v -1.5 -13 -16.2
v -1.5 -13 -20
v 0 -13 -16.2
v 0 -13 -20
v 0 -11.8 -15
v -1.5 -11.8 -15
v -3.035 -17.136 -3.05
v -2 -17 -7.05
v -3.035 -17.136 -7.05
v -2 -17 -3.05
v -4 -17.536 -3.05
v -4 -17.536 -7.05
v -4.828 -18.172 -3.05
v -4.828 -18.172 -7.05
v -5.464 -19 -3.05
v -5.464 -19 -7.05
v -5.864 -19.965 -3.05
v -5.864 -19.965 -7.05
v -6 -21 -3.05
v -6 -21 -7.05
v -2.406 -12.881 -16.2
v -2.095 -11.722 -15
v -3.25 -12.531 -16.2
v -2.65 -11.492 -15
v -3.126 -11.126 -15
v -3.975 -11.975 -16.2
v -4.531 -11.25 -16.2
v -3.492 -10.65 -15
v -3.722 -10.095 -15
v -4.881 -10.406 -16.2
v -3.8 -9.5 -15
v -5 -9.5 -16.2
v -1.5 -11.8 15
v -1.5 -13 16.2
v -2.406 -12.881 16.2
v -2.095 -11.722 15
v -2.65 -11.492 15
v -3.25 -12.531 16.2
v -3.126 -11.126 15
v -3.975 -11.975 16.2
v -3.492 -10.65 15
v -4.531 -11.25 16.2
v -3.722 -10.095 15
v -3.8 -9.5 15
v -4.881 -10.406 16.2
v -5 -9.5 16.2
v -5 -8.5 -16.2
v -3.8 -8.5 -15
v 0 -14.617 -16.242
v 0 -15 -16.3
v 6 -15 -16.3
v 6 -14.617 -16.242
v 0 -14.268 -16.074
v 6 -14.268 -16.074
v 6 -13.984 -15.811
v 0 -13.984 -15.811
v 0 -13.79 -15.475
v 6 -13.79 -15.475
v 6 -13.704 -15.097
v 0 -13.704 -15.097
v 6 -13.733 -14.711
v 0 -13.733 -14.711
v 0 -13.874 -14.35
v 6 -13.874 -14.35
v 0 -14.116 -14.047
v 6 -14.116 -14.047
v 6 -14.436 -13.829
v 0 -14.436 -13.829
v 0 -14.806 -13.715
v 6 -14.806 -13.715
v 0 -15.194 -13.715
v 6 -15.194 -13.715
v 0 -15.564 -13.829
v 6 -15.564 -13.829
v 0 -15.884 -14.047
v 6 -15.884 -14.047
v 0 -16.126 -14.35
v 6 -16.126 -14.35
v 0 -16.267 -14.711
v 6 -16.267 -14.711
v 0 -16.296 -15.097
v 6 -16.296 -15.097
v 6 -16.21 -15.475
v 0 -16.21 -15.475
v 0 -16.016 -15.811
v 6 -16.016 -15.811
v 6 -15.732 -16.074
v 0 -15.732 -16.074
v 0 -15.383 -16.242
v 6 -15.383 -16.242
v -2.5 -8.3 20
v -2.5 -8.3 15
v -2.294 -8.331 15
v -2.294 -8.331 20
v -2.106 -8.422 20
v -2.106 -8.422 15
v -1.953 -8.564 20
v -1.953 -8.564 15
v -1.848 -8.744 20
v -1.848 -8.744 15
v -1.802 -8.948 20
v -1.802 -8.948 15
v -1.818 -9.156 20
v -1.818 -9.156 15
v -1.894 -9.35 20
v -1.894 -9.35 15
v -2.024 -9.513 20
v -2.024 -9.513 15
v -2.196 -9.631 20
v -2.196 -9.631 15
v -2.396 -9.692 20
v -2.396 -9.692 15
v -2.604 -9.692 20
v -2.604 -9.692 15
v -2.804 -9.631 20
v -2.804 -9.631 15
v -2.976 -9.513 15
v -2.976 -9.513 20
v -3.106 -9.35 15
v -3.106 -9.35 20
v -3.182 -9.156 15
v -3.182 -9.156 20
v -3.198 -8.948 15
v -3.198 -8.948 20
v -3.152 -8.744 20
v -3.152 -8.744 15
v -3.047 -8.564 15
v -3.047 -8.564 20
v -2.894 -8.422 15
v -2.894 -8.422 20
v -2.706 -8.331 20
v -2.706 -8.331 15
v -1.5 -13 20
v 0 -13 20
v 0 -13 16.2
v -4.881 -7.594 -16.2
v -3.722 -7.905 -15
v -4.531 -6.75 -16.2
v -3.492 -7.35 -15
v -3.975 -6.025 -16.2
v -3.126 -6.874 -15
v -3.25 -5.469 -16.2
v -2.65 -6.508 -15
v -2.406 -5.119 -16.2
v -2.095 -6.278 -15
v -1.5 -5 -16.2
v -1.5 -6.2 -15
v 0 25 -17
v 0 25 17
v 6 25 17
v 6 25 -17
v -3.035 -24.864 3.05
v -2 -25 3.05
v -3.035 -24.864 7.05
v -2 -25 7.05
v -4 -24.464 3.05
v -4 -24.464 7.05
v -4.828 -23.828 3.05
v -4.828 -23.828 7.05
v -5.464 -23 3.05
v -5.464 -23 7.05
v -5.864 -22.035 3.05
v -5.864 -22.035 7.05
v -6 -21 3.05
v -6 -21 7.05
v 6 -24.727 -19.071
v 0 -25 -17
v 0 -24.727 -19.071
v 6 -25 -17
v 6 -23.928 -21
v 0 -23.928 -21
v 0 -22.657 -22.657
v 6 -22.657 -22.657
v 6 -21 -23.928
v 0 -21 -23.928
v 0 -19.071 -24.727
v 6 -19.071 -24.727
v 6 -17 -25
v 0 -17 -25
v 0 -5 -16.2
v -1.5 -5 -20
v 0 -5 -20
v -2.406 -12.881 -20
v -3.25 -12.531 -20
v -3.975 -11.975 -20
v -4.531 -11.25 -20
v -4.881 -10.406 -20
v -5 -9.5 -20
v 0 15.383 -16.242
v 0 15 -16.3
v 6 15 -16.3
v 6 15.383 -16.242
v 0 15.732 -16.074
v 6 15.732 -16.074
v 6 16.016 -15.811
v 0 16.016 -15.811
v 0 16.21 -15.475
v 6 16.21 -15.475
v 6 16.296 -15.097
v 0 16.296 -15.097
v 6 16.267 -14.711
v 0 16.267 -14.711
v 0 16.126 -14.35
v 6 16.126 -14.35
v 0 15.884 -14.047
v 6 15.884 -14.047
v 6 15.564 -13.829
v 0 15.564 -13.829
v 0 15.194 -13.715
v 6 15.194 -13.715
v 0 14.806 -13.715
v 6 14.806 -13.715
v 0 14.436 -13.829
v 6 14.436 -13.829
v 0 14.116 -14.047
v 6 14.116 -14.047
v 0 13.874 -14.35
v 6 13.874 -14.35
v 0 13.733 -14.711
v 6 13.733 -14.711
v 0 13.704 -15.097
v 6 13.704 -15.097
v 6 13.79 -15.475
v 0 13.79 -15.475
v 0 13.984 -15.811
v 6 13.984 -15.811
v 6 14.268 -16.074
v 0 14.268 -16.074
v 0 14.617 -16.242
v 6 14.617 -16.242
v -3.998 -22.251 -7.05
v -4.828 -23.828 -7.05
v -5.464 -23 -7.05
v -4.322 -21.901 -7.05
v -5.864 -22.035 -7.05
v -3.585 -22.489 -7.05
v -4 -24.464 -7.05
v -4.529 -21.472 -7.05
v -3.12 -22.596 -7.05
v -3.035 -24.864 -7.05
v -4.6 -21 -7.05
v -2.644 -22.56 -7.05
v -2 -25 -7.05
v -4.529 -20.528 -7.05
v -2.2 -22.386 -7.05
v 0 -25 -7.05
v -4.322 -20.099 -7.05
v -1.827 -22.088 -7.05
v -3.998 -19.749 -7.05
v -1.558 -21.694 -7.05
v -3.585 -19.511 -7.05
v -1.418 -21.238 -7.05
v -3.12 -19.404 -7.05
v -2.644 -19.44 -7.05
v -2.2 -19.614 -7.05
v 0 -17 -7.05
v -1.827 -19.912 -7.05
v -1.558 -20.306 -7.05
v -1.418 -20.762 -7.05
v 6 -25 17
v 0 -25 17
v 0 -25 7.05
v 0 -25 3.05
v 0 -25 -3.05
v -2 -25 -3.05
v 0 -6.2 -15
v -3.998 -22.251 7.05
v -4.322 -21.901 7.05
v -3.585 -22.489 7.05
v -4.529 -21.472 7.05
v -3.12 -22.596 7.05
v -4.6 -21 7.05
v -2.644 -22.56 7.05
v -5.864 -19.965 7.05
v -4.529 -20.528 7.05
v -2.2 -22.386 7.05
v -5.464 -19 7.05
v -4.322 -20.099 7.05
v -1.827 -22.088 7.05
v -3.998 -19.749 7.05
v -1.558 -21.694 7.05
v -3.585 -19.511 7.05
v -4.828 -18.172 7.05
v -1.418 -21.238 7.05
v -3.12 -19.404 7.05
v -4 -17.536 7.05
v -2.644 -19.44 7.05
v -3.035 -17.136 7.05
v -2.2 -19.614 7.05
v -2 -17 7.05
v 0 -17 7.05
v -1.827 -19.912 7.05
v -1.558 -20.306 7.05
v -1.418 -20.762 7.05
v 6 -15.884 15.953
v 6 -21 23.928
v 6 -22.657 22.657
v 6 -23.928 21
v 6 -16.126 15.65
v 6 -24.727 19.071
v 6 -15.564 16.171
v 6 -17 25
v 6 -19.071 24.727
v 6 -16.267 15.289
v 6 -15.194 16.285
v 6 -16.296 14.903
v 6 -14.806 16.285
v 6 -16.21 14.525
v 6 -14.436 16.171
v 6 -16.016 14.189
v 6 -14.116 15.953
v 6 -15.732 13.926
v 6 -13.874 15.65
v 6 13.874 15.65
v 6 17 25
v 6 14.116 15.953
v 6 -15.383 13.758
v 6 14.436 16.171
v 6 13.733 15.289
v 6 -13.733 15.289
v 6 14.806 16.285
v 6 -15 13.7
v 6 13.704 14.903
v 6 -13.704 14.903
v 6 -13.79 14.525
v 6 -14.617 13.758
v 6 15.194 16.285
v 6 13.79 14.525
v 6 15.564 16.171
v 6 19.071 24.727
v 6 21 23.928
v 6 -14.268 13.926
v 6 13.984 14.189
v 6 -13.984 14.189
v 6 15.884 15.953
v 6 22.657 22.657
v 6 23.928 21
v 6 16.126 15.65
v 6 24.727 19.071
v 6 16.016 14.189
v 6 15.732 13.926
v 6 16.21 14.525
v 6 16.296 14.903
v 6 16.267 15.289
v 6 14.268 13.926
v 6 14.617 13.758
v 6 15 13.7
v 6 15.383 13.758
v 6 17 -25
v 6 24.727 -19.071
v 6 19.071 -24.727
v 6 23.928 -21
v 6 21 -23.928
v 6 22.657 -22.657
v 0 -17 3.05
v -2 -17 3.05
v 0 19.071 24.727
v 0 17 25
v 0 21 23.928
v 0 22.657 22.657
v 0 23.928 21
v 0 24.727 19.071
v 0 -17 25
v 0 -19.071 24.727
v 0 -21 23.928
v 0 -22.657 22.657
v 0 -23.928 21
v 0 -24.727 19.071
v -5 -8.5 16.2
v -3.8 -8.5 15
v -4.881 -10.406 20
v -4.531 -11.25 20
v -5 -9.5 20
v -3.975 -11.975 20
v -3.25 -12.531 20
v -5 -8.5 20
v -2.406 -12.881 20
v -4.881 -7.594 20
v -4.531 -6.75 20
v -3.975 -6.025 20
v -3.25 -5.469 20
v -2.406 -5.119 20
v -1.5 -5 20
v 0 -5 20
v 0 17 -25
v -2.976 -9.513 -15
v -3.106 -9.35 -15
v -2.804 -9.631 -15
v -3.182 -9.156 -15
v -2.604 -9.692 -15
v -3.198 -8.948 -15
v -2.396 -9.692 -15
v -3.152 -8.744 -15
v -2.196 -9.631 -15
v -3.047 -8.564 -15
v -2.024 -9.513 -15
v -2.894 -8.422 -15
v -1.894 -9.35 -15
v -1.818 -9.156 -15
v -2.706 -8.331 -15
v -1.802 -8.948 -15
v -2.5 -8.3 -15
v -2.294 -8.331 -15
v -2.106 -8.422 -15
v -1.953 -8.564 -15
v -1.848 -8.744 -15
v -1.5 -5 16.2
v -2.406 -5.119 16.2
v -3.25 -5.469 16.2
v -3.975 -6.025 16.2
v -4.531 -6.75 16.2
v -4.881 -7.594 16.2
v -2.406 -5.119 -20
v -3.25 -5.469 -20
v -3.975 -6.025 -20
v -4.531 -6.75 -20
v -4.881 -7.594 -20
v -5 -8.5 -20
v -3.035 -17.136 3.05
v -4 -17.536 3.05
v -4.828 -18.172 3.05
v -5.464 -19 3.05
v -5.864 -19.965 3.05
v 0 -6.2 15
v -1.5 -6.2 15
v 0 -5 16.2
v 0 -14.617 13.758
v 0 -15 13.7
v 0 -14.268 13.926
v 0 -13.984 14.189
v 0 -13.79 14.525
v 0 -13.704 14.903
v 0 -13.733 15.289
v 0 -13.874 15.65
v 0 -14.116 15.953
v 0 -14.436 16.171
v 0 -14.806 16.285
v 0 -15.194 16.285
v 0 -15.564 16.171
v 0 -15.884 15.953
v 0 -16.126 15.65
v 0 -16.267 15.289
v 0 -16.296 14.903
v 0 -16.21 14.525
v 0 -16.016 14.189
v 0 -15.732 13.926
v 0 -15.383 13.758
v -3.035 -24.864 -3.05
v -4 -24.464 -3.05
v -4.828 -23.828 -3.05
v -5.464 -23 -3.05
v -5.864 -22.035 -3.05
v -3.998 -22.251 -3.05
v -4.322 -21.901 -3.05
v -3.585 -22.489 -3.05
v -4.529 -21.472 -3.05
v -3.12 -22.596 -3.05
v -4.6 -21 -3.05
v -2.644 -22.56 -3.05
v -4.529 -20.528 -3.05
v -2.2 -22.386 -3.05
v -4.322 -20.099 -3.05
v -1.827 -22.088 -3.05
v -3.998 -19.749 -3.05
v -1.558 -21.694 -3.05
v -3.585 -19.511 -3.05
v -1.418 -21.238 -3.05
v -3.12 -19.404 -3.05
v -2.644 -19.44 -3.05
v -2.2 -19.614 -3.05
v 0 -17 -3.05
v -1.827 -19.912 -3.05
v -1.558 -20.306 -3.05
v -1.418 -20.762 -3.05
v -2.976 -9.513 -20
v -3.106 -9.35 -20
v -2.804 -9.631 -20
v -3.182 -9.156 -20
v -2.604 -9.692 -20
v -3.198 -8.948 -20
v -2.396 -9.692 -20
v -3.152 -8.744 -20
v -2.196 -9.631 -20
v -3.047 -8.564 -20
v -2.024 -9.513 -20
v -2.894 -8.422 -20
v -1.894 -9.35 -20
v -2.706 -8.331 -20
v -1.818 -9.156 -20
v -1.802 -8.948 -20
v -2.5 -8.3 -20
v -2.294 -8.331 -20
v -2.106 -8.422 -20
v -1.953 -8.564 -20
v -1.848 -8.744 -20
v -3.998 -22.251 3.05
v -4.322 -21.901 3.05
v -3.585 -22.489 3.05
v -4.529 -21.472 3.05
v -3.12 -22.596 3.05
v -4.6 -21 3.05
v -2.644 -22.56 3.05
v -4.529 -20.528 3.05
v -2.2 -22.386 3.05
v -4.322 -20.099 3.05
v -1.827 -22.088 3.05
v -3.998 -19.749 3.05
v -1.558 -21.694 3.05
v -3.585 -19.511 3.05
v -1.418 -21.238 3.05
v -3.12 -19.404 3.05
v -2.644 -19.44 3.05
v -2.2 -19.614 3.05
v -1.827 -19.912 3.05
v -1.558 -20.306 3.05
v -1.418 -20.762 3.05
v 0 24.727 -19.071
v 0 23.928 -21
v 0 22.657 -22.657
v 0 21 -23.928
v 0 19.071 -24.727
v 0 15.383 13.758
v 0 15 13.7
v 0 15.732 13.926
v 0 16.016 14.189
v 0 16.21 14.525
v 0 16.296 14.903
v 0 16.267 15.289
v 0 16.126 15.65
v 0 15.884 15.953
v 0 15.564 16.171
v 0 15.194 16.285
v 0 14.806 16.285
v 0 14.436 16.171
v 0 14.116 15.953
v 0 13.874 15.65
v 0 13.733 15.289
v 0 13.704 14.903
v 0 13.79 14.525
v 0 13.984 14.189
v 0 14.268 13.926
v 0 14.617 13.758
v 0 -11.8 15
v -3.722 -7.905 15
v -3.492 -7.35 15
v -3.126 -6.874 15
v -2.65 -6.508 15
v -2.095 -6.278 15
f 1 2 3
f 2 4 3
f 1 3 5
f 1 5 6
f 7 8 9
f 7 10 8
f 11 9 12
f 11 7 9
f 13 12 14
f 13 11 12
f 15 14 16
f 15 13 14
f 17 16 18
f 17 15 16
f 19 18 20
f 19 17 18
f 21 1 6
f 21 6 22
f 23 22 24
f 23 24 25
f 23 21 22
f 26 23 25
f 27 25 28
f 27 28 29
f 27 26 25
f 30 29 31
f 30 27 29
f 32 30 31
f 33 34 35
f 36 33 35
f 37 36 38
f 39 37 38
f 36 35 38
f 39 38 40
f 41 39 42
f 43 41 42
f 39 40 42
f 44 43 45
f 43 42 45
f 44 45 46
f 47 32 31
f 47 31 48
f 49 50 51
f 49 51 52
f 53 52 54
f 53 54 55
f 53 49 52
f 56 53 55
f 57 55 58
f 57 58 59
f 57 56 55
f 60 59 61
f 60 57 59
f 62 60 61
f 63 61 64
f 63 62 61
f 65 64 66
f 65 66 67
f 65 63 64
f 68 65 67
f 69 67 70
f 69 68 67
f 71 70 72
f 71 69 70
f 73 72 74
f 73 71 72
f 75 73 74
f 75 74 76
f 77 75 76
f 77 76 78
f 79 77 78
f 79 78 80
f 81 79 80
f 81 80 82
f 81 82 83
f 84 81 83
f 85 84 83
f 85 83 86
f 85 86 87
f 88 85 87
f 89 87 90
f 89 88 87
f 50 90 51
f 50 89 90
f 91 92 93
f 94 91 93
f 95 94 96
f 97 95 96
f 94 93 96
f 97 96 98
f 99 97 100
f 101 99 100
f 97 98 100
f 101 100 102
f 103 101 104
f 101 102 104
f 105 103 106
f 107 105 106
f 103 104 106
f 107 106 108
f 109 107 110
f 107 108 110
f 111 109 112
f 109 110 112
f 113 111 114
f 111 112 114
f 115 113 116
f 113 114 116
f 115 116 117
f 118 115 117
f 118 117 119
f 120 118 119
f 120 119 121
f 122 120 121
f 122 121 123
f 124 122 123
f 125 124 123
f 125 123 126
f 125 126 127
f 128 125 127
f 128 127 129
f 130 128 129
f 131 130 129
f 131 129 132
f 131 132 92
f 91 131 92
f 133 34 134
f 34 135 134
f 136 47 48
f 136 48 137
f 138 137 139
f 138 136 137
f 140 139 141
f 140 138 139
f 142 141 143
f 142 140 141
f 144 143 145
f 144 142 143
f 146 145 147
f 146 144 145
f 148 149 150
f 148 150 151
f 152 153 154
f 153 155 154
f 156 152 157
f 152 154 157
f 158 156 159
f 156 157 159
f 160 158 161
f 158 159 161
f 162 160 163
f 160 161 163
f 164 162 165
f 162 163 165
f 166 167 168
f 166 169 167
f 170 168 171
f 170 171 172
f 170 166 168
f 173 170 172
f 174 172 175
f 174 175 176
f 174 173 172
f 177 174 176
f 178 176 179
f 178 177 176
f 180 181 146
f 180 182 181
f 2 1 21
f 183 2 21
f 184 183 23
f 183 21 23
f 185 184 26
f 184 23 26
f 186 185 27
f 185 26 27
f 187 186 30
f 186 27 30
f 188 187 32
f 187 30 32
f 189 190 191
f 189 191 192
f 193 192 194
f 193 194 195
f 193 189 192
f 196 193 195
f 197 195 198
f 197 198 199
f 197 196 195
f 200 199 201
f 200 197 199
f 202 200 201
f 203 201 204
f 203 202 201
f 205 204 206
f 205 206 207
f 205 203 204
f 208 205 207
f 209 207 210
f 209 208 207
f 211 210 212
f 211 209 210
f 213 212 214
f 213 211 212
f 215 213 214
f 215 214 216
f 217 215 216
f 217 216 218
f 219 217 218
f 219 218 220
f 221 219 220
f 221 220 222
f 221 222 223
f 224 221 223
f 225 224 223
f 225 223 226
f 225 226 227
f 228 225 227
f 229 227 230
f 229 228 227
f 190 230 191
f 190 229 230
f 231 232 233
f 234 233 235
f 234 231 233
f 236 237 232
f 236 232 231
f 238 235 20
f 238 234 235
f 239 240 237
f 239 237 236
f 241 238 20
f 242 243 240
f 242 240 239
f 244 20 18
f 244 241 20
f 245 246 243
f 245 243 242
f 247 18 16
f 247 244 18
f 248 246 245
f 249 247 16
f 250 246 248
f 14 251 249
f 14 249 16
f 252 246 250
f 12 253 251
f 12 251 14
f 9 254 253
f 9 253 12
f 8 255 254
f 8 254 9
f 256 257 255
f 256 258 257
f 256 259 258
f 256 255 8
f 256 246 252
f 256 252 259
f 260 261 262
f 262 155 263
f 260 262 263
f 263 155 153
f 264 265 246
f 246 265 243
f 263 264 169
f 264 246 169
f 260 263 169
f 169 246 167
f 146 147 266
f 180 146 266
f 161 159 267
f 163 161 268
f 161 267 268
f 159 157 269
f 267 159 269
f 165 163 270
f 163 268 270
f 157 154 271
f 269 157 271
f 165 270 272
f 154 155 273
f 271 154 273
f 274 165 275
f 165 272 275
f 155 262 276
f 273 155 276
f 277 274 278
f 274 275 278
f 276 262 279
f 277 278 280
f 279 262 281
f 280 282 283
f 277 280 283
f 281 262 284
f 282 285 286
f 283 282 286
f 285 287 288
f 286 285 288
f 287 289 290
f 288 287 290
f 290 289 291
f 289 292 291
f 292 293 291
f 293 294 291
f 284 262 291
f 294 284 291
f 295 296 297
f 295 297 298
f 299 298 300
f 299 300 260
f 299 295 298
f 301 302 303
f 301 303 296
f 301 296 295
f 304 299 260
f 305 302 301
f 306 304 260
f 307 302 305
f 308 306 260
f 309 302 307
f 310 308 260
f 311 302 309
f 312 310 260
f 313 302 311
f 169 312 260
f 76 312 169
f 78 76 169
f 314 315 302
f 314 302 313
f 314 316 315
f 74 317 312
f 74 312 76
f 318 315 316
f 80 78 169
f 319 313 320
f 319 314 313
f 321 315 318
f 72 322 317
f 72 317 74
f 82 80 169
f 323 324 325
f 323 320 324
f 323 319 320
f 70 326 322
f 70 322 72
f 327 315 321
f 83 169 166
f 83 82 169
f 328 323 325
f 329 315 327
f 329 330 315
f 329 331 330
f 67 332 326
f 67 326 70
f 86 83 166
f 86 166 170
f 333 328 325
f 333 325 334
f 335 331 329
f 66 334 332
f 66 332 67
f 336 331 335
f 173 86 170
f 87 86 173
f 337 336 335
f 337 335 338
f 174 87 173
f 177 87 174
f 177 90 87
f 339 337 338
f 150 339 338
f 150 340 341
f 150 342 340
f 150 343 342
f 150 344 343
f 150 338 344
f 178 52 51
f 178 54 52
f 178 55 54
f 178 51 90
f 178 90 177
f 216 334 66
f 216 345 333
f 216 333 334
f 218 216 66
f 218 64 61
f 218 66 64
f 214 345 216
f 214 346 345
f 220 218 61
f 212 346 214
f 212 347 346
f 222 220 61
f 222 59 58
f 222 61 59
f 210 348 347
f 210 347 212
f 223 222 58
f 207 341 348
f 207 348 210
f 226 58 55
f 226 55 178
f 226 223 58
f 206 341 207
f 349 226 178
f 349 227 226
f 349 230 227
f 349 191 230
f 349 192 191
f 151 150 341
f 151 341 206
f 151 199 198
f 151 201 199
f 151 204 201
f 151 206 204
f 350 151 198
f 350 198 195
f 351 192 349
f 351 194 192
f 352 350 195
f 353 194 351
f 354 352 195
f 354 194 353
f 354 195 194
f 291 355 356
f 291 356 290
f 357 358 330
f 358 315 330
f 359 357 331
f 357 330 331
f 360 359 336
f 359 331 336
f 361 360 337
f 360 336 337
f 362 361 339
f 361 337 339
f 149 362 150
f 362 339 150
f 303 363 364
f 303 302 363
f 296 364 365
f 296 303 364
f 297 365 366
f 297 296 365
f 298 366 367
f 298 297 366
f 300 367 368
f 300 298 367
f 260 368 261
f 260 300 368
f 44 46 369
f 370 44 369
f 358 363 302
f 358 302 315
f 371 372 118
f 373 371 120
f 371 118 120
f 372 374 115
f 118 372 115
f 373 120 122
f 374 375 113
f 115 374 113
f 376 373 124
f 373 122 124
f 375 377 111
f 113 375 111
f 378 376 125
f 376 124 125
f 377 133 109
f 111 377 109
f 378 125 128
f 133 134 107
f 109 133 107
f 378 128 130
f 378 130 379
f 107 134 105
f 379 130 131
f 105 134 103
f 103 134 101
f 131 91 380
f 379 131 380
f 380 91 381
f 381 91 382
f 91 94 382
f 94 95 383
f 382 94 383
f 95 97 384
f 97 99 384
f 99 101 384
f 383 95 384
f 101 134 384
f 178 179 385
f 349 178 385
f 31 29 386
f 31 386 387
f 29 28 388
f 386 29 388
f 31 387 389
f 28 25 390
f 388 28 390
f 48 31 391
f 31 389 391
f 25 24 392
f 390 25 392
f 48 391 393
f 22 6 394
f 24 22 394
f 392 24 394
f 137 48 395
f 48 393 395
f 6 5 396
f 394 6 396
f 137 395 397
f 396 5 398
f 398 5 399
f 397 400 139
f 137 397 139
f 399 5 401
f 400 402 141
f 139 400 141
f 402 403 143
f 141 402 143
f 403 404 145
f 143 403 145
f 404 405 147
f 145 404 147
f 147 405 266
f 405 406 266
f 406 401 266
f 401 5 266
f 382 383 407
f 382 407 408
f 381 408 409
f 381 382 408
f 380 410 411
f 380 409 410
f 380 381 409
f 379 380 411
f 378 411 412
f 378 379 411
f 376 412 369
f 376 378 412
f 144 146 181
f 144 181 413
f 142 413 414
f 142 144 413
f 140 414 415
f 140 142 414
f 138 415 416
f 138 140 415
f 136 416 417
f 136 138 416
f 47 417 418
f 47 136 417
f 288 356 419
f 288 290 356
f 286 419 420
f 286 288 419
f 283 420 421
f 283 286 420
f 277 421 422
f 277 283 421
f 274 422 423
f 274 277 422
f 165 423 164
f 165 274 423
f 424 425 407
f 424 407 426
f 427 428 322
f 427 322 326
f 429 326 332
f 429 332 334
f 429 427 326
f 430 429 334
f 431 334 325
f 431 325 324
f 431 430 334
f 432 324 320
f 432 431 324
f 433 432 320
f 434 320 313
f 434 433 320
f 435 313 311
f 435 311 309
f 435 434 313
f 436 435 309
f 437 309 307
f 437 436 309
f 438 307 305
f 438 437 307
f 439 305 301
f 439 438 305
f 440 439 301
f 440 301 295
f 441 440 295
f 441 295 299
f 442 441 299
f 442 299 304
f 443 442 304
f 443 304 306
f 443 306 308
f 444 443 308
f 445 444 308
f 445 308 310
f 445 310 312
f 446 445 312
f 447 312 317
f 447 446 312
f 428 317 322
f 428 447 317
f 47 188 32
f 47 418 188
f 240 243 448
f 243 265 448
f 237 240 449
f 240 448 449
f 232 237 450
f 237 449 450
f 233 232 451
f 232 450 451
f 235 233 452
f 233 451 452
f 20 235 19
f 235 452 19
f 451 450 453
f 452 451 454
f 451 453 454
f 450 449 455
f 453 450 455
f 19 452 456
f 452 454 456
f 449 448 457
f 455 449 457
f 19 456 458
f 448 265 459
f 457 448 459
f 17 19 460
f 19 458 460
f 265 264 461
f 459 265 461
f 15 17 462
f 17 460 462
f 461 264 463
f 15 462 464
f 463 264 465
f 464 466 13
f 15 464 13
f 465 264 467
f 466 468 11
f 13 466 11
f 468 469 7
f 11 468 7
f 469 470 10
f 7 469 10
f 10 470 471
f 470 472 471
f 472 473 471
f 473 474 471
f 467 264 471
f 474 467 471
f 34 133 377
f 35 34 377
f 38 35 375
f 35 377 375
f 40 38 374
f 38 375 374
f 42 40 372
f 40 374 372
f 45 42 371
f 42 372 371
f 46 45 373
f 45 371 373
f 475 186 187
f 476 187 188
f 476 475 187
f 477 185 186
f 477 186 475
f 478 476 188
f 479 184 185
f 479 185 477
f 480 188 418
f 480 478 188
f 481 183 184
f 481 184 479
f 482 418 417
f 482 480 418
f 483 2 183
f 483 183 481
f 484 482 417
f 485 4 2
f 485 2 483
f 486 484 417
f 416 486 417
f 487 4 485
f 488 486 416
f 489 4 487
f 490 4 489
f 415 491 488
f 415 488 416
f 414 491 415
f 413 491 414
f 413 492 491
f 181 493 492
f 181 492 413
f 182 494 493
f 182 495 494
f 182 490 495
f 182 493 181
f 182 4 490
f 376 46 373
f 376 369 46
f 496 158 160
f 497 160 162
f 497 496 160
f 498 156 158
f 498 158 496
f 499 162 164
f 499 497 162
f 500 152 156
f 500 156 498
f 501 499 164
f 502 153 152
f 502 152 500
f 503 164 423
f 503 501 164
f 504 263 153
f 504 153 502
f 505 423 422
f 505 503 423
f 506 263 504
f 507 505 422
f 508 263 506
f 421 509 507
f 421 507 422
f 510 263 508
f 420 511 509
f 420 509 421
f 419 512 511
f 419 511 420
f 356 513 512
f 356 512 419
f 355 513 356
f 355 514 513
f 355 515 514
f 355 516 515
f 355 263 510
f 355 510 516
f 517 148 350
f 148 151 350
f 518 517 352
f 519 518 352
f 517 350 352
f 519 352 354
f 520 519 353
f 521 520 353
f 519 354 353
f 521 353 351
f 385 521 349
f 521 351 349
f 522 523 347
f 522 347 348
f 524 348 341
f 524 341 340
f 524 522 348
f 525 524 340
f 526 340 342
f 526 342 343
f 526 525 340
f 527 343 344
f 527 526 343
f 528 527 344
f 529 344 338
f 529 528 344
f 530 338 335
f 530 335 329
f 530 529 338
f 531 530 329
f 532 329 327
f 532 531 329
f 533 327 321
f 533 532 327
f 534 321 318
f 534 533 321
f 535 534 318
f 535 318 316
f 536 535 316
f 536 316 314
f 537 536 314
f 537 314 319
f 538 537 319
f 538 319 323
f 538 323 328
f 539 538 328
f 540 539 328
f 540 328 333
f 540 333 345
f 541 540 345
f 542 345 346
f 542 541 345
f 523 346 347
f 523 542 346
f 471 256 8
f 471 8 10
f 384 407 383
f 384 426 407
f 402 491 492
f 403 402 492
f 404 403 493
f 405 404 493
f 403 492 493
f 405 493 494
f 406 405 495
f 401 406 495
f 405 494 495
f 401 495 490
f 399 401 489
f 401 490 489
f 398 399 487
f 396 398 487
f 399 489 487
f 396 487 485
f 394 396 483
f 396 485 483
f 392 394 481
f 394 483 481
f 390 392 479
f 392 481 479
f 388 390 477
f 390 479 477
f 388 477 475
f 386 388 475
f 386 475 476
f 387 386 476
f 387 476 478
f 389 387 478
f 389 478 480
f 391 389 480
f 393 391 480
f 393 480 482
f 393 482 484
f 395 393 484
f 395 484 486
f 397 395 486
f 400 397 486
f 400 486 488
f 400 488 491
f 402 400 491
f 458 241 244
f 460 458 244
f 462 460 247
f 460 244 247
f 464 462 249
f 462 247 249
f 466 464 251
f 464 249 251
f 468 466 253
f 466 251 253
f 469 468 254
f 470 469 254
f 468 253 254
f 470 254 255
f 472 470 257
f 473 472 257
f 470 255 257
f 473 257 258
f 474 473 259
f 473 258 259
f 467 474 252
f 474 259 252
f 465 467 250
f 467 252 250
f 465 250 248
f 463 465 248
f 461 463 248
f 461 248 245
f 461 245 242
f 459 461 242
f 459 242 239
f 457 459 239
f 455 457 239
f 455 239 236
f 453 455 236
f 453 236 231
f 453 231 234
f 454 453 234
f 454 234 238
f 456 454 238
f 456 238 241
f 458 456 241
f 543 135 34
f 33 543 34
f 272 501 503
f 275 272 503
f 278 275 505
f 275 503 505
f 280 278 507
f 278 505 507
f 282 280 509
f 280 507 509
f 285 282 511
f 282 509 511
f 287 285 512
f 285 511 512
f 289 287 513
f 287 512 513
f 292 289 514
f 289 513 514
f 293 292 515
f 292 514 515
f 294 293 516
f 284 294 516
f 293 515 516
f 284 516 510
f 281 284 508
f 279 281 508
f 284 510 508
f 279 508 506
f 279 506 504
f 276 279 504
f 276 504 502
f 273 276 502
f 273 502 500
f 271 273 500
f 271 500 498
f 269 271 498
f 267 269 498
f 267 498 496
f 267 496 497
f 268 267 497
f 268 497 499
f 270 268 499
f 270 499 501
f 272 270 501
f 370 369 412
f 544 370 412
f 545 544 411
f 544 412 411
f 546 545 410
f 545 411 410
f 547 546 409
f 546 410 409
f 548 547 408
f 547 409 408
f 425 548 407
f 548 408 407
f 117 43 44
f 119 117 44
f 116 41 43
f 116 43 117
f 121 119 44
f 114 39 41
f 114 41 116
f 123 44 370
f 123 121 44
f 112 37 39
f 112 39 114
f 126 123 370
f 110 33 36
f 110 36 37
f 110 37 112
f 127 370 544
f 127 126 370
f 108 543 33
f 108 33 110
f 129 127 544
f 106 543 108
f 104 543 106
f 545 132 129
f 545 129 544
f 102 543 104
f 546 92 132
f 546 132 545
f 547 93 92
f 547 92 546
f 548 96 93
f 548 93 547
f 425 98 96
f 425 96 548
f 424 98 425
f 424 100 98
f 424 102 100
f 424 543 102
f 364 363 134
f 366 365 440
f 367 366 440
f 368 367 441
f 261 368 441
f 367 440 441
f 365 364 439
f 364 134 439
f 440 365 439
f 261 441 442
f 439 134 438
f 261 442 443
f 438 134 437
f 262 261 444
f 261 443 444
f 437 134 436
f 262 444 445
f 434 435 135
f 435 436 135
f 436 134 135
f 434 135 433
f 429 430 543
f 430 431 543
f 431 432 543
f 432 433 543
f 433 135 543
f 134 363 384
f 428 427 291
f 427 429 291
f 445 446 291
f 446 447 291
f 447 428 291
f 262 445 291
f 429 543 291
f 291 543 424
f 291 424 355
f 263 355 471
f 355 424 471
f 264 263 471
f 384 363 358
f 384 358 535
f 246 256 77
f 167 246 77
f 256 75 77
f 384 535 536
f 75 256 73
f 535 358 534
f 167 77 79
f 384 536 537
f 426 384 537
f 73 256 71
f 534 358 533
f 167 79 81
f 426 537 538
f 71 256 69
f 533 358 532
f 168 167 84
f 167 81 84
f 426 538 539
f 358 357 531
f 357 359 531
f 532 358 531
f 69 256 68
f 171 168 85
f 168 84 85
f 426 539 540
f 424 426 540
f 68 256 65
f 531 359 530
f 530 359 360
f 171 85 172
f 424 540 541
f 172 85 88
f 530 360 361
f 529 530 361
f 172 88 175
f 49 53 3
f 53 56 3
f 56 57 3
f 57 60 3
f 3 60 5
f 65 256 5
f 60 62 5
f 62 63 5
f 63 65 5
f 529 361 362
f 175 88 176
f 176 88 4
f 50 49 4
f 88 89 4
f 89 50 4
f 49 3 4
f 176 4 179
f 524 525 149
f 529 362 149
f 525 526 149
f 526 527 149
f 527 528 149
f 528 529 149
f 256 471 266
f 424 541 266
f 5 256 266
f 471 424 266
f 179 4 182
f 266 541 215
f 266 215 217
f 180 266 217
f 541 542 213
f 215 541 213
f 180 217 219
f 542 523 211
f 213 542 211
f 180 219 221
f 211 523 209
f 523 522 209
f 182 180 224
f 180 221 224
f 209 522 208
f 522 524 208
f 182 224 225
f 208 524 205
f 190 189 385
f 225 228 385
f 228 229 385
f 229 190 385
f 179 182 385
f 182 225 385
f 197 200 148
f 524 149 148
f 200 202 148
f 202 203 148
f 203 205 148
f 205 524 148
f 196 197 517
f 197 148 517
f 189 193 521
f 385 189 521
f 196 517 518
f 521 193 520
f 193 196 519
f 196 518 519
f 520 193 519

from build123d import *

# Parameters (mm, degrees)
SKETCH1_W           = 50
SKETCH1_H           = 50
SKETCH1_R           = 1.3
BOSS_EXTRUDE1_DEPTH = 6
FILLET1_R           = 8
SKETCH2_W           = 4
SKETCH2_H           = 8
BOSS_EXTRUDE2_DEPTH = 6
FILLET2_R           = 4
SKETCH6_R           = 1.6
CUT_EXTRUDE3_DEPTH  = 36
SKETCH4_W           = 5
SKETCH4_H           = 8
BOSS_EXTRUDE4_DEPTH = 5
FILLET3_R           = 3.5
SKETCH5_R           = 0.7
CUT_EXTRUDE2_DEPTH  = 44
CHAMFER3_SIZE       = 1.2


with BuildPart() as part:
    # Sketch1 → Boss-Extrude1 (new body)
    with BuildSketch(Plane(origin=(0, 0, 0), x_dir=(0, 0, -1), z_dir=(1, 0, 0))):
        Rectangle(SKETCH1_W, SKETCH1_H)
        with Locations((-15, 15)):
            Circle(SKETCH1_R, mode=Mode.SUBTRACT)
        with Locations((15, 15)):
            Circle(SKETCH1_R, mode=Mode.SUBTRACT)
        with Locations((15, -15)):
            Circle(SKETCH1_R, mode=Mode.SUBTRACT)
        with Locations((-15, -15)):
            Circle(SKETCH1_R, mode=Mode.SUBTRACT)
    extrude(amount=BOSS_EXTRUDE1_DEPTH)

    # Fillet1
    fillet1_edges = [part.edges().sort_by_distance(p)[0] for p in [
        (3, -25, -25),
        (3, -25, 25),
        (3, 25, 25),
        (3, 25, -25),
    ]]
    fillet(fillet1_edges, radius=FILLET1_R)

    # Sketch2 → Boss-Extrude2 (add)
    with BuildSketch(Plane.ZY):
        with Locations((-5.05, -21)):
            Rectangle(SKETCH2_W, SKETCH2_H)
        with Locations((5.05, -21)):
            Rectangle(SKETCH2_W, SKETCH2_H)
    extrude(amount=BOSS_EXTRUDE2_DEPTH)

    # Fillet2
    fillet2_edges = [part.edges().sort_by_distance(p)[0] for p in [
        (-6, -25, 5.05),
        (-6, -25, -5.05),
        (-6, -17, -5.05),
        (-6, -17, 5.05),
    ]]
    fillet(fillet2_edges, radius=FILLET2_R - 0.0001)  # a hair under: the kernel refuses the full size

    # Sketch6 → Cut-Extrude3 (cut)
    with BuildSketch(Plane(origin=(0, 0, -7.05), x_dir=(-1, 0, 0), z_dir=(0, 0, -1))):
        with Locations((3, -21)):
            Circle(SKETCH6_R)
    extrude(amount=-CUT_EXTRUDE3_DEPTH, mode=Mode.SUBTRACT)

    # Sketch4 → Boss-Extrude4 (add)
    with BuildSketch(Plane.ZY):
        with Locations((-17.5, -9)):
            Rectangle(SKETCH4_W, SKETCH4_H)
        with Locations((17.5, -9)):
            Rectangle(SKETCH4_W, SKETCH4_H)
    extrude(amount=BOSS_EXTRUDE4_DEPTH)

    # Fillet3
    fillet3_edges = [part.edges().sort_by_distance(p)[0] for p in [
        (-5, -5, -17.5),
        (-5, -13, -17.5),
        (-5, -13, 17.5),
        (-5, -5, 17.5),
    ]]
    fillet(fillet3_edges, radius=FILLET3_R)

    # Sketch5 → Cut-Extrude2 (cut)
    with BuildSketch(Plane(origin=(0, 0, -20), x_dir=(-1, 0, 0), z_dir=(0, 0, -1))):
        with Locations(Location((2.5, -9, 0), (0, 0, 90))):
            Circle(SKETCH5_R)
    extrude(amount=-CUT_EXTRUDE2_DEPTH, mode=Mode.SUBTRACT)

    # Chamfer3
    chamfer3_edges = [part.edges().sort_by_distance(p)[0] for p in [
        (-5, -9, 15),
        (-0.75, -13, 15),
        (-0.75, -5, 15),
        (-3.974873734, -6.025126266, 15),
        (-3.974873734, -11.974873734, 15),
        (-5, -9, -15),
        (-0.75, -5, -15),
        (-0.75, -13, -15),
        (-3.974873734, -6.025126266, -15),
        (-3.974873734, -11.974873734, -15),
    ]]
    chamfer(chamfer3_edges, length=CHAMFER3_SIZE)


solid = part.part
